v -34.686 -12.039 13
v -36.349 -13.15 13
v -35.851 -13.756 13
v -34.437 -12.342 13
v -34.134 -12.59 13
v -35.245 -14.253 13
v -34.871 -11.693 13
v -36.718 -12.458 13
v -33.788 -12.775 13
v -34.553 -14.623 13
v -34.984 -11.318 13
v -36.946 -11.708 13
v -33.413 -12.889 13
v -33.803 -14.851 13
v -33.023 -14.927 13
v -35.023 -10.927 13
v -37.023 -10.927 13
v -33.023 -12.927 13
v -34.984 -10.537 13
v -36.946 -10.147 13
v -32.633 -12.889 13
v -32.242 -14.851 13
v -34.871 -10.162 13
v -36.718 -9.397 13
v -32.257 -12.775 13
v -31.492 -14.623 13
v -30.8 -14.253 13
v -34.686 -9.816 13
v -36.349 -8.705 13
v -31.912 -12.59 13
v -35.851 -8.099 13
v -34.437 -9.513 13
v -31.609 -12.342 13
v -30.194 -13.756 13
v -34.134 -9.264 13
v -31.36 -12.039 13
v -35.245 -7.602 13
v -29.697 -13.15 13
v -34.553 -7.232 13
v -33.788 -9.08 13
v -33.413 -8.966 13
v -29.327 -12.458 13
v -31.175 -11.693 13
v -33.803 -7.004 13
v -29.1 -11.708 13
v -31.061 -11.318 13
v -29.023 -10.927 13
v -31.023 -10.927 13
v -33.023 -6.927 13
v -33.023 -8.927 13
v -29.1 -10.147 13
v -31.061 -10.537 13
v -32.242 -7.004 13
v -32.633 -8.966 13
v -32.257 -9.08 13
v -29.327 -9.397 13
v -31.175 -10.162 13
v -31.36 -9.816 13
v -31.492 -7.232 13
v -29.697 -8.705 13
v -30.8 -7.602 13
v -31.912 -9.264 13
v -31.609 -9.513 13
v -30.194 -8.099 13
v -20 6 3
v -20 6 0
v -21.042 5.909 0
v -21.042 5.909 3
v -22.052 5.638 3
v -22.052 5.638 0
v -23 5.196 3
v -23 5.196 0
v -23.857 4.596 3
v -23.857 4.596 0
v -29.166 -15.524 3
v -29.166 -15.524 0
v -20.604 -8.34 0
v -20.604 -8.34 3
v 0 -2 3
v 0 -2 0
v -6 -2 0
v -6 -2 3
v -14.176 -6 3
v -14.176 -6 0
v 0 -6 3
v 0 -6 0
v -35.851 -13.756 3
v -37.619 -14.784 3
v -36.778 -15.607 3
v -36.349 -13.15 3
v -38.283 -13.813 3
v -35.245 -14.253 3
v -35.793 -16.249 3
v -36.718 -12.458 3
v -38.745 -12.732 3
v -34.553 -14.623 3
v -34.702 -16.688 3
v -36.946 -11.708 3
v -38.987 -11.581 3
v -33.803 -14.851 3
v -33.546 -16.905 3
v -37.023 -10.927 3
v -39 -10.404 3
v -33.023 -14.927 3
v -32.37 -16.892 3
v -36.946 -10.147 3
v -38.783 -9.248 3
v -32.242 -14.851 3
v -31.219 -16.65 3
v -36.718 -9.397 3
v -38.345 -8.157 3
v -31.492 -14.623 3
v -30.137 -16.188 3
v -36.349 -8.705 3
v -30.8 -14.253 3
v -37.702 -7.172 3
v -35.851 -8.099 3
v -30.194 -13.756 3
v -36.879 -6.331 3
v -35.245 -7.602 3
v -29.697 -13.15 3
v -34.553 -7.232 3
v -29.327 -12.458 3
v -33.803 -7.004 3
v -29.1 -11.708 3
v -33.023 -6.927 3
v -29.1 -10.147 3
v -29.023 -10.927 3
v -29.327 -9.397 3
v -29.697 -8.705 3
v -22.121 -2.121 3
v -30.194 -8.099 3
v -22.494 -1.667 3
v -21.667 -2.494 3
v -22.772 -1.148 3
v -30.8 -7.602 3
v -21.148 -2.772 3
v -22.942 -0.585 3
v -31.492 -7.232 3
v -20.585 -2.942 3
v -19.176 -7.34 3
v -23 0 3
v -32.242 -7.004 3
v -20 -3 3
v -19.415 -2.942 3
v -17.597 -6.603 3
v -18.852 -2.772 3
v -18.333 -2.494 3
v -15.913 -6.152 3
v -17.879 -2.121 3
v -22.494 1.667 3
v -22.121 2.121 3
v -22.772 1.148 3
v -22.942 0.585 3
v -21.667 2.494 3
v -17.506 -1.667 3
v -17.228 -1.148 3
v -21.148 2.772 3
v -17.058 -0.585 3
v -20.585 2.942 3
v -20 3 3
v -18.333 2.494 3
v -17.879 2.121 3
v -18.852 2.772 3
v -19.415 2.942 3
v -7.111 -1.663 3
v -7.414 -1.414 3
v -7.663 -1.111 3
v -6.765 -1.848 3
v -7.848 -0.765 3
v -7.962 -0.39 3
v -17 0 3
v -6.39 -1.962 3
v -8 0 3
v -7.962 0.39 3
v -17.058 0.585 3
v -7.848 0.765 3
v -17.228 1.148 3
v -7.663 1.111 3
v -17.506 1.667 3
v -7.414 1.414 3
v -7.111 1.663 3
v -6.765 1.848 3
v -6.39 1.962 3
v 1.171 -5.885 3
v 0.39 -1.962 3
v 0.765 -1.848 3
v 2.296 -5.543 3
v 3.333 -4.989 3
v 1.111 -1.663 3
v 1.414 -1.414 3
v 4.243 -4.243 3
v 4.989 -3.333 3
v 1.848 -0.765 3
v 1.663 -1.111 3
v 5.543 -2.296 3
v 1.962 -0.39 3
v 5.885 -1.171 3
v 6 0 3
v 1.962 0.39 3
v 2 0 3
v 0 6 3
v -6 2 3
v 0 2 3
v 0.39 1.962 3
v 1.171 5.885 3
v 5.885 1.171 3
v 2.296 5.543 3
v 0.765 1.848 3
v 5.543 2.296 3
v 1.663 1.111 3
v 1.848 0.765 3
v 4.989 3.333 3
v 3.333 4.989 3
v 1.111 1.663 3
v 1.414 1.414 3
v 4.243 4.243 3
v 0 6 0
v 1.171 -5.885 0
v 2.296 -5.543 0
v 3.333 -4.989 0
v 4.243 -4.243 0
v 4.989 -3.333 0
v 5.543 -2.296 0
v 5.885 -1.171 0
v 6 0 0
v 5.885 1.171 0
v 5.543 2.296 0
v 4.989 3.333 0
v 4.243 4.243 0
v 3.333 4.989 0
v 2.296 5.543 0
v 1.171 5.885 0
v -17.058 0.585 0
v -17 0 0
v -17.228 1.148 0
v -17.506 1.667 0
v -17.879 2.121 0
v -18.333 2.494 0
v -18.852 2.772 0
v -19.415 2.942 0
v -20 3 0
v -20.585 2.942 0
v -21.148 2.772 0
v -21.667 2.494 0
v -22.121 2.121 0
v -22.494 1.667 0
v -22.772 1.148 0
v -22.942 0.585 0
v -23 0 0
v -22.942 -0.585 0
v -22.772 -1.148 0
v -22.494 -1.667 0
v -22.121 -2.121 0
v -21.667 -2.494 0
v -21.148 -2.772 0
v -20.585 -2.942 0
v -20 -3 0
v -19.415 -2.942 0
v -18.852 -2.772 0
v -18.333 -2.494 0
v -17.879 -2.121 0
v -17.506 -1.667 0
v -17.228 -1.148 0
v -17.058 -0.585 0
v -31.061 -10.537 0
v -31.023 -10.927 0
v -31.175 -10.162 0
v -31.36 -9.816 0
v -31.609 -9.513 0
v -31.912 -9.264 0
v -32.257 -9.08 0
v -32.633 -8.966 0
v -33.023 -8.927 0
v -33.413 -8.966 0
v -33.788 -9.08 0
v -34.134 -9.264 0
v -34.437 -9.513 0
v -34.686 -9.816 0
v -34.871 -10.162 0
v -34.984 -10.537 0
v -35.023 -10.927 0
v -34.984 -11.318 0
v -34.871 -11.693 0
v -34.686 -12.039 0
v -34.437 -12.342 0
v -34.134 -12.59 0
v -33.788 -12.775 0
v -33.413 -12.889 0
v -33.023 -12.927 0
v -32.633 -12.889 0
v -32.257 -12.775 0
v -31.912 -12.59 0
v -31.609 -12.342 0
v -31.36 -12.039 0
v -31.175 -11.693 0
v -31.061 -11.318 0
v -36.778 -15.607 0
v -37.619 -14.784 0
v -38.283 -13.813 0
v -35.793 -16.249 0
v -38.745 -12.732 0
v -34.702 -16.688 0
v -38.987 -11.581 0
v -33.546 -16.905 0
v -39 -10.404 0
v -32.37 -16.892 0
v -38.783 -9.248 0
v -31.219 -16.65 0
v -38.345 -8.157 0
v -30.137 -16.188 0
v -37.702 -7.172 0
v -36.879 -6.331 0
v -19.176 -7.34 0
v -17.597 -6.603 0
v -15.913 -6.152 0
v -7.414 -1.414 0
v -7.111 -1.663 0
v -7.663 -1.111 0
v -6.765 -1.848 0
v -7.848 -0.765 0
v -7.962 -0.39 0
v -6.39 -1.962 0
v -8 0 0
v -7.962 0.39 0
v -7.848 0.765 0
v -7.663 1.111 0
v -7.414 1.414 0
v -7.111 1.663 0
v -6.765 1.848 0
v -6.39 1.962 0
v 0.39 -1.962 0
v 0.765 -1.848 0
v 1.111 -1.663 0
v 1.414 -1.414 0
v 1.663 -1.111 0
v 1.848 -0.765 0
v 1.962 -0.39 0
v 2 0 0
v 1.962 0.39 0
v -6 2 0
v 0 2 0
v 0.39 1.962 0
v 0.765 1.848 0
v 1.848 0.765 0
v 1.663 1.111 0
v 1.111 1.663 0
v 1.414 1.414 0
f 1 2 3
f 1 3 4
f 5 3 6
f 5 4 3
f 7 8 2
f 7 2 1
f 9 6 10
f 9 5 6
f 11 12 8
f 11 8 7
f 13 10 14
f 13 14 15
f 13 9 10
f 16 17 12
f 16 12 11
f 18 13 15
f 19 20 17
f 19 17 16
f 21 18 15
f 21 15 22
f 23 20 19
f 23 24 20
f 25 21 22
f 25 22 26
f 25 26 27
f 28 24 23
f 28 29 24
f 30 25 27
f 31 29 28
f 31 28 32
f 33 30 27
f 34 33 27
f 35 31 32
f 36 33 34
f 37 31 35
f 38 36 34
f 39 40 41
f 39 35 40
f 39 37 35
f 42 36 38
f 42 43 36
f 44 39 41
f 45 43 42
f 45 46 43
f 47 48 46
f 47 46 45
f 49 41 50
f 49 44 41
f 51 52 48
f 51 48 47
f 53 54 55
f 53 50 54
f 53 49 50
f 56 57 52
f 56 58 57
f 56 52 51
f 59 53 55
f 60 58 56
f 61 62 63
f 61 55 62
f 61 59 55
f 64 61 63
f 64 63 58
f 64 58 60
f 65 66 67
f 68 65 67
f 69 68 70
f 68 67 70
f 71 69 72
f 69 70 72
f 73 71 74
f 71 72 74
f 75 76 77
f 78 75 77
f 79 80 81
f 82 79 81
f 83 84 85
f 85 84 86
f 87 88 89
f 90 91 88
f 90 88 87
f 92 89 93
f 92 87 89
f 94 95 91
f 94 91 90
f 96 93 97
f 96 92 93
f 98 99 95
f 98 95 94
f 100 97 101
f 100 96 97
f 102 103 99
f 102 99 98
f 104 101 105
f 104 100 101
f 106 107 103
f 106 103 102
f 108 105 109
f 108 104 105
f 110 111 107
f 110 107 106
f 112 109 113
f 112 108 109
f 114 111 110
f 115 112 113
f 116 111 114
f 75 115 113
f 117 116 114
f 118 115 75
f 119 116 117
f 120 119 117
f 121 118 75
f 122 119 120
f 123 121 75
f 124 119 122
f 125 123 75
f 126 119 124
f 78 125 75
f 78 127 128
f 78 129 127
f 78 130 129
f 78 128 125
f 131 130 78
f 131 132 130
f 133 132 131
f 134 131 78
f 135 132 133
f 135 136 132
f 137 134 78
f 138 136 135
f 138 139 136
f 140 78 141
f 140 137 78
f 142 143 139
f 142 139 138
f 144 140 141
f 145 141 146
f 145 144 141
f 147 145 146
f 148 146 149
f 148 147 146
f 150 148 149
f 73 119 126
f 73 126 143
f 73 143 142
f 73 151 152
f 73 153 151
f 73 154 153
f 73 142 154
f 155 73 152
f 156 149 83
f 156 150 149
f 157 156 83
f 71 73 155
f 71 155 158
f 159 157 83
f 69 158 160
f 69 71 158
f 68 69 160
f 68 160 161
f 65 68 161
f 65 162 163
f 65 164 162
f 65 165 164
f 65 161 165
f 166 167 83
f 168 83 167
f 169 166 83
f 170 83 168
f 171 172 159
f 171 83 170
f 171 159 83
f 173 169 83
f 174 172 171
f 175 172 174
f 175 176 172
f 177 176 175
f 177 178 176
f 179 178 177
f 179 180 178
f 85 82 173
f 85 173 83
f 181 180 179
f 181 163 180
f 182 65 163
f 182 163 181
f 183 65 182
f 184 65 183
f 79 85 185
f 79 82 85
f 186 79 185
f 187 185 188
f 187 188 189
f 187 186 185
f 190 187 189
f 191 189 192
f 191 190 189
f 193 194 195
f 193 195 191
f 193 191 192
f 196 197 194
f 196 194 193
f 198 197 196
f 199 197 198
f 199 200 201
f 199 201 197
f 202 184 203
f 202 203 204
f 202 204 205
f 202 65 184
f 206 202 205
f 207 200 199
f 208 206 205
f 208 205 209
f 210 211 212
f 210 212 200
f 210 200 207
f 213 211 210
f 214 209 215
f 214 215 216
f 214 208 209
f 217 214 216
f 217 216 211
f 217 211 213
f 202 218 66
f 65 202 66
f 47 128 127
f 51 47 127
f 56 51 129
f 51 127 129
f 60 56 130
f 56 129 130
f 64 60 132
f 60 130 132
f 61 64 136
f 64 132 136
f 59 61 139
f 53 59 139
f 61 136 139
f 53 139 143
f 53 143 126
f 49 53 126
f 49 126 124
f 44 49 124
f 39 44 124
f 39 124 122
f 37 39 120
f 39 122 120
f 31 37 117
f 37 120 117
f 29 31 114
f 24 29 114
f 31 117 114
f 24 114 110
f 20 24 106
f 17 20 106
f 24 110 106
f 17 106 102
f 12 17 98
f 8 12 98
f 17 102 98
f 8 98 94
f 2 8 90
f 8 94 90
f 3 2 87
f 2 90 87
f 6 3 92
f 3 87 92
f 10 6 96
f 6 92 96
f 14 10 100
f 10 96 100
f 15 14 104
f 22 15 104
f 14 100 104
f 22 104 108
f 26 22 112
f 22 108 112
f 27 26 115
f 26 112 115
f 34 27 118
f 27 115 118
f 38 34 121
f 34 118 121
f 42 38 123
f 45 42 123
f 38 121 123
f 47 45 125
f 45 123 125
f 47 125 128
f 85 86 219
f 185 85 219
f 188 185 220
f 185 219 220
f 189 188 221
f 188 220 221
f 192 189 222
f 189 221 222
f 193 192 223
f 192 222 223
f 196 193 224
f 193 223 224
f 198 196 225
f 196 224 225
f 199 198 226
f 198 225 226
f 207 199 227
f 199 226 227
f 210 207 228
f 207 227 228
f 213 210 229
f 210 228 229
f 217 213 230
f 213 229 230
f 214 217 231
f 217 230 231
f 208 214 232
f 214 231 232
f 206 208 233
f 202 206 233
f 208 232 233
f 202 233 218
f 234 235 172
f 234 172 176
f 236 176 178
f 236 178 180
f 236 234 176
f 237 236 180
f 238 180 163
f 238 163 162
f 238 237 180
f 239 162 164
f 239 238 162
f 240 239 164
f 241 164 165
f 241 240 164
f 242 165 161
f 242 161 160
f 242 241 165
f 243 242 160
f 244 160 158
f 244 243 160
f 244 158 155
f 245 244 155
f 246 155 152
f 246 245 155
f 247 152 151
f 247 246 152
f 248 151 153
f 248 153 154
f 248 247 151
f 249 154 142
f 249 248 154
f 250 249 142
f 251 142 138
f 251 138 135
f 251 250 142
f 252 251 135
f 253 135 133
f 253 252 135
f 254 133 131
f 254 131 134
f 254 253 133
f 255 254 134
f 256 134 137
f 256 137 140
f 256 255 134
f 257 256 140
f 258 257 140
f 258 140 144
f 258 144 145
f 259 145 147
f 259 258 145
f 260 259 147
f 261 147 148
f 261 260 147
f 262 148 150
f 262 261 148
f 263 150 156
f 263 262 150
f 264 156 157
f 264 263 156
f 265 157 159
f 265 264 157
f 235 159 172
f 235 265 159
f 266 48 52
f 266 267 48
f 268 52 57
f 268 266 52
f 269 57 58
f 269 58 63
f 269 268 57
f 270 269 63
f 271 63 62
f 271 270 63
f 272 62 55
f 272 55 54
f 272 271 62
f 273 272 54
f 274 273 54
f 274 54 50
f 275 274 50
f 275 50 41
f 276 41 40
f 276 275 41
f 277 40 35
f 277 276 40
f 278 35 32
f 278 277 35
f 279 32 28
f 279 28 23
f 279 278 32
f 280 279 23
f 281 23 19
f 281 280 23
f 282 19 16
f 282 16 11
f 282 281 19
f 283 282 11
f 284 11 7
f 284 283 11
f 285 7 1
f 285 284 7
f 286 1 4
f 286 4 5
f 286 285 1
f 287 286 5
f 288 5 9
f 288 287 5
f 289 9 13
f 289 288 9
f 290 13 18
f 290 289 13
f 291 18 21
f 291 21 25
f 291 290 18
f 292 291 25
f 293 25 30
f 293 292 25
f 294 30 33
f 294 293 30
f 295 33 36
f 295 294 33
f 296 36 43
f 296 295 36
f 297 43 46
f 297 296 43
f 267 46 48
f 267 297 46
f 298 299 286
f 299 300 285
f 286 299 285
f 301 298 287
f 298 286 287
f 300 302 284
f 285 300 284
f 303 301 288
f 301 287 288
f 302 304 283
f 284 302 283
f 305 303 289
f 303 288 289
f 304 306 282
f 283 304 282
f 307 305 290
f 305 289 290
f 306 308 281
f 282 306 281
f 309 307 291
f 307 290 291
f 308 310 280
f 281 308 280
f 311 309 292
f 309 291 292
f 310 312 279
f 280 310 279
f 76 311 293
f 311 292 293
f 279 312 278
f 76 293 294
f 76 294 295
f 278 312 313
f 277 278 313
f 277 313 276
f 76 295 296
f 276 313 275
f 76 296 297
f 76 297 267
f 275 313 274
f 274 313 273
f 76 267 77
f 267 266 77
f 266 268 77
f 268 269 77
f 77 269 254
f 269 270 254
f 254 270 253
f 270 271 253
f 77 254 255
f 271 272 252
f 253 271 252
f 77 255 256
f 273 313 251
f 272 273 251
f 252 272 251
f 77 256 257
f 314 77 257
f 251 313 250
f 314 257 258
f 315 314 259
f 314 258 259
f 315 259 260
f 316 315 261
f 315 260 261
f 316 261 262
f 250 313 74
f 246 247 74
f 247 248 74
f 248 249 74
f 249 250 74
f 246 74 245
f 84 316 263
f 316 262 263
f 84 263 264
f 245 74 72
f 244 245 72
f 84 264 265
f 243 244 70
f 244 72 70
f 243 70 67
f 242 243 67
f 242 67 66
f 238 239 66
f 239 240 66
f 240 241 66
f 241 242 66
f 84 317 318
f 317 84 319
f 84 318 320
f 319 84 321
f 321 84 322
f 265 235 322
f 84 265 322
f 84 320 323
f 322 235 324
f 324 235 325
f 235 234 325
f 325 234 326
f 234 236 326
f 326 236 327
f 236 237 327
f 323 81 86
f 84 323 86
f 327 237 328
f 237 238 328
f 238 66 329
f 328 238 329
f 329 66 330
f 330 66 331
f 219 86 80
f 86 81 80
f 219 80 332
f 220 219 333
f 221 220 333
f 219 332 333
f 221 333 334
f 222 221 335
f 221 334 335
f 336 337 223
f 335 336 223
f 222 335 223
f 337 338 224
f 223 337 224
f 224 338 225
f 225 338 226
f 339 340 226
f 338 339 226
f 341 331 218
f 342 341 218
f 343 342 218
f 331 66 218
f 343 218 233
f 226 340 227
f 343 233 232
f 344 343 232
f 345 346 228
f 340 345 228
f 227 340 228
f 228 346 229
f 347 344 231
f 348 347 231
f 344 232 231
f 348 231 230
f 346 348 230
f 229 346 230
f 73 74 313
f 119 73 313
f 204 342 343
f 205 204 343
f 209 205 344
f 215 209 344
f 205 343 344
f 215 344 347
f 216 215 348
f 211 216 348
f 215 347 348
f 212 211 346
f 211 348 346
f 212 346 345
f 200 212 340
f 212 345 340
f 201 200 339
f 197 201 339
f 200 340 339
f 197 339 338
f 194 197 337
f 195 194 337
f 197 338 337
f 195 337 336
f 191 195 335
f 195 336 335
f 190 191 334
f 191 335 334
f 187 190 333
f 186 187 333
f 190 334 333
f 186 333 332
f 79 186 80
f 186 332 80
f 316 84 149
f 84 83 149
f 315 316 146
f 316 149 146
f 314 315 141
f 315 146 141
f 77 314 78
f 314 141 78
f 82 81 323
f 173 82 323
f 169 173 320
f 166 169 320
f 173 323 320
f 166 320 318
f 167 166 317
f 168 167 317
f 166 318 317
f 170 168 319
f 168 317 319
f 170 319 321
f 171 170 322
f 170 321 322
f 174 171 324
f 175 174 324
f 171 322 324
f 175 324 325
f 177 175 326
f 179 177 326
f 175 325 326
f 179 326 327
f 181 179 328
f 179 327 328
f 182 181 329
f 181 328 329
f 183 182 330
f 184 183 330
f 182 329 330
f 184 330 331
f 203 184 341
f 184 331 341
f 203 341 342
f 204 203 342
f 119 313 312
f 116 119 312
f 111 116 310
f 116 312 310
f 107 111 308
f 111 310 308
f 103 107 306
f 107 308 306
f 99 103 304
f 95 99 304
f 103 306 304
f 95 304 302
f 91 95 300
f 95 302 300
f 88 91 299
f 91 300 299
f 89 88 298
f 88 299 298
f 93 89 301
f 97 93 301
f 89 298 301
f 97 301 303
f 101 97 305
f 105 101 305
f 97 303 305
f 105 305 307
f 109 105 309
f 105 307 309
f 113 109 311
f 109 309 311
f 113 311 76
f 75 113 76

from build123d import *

# Parameters (mm, degrees)
SKETCH_1_R      = 3
SKETCH_1_R_2    = 2
EXTRUDE_1_DEPTH = 3
FILLET_1_R      = 10
SKETCH_2_R      = 4
SKETCH_2_R_2    = 2
EXTRUDE_2_DEPTH = 10


with BuildPart() as part:
    # Эскиз1 → Бобышка-Вытянуть1 (new body)
    with BuildSketch(Plane.XY):
        with BuildLine():
            Line((-17.816178594, -6), (0, -6))
            ThreePointArc((0, -6), (6, 0), (0, 6))
            Line((0, 6), (-20, 6))
            ThreePointArc((-20, 6), (-22.05212086, 5.638155725), (-23.856725658, 4.596266659))
            Line((-23.856725658, 4.596266659), (-36.879481191, -6.331122706))
            ThreePointArc((-36.879481191, -6.331122706), (-37.619022192, -14.784115023), (-29.166029875, -15.523656023))
            Line((-29.166029875, -15.523656023), (-17.816178594, -6))
        make_face()
        with Locations((-20, 0)):
            Circle(SKETCH_1_R, mode=Mode.SUBTRACT)
        with BuildLine():
            Line((-6, 2), (0, 2))
            ThreePointArc((0, 2), (2, 0), (0, -2))
            Line((0, -2), (-6, -2))
            ThreePointArc((-6, -2), (-8, 0), (-6, 2))
        make_face(mode=Mode.SUBTRACT)
        with Locations((-33.022755533, -10.927389365)):
            Circle(SKETCH_1_R_2, mode=Mode.SUBTRACT)
    extrude(amount=EXTRUDE_1_DEPTH)

    # Скругление1
    fillet_1_edges = [part.edges().sort_by_distance(p)[0] for p in [
        (-17.816178594, -6, 1.5),
    ]]
    fillet(fillet_1_edges, radius=FILLET_1_R)

    # Эскиз2 → Бобышка-Вытянуть2 (add)
    with BuildSketch(Plane.XY.offset(3)):
        with Locations((-33.022755533, -10.927389365)):
            Circle(SKETCH_2_R)
        with Locations((-33.022755533, -10.927389365)):
            Circle(SKETCH_2_R_2, mode=Mode.SUBTRACT)
    extrude(amount=EXTRUDE_2_DEPTH)


solid = part.part
